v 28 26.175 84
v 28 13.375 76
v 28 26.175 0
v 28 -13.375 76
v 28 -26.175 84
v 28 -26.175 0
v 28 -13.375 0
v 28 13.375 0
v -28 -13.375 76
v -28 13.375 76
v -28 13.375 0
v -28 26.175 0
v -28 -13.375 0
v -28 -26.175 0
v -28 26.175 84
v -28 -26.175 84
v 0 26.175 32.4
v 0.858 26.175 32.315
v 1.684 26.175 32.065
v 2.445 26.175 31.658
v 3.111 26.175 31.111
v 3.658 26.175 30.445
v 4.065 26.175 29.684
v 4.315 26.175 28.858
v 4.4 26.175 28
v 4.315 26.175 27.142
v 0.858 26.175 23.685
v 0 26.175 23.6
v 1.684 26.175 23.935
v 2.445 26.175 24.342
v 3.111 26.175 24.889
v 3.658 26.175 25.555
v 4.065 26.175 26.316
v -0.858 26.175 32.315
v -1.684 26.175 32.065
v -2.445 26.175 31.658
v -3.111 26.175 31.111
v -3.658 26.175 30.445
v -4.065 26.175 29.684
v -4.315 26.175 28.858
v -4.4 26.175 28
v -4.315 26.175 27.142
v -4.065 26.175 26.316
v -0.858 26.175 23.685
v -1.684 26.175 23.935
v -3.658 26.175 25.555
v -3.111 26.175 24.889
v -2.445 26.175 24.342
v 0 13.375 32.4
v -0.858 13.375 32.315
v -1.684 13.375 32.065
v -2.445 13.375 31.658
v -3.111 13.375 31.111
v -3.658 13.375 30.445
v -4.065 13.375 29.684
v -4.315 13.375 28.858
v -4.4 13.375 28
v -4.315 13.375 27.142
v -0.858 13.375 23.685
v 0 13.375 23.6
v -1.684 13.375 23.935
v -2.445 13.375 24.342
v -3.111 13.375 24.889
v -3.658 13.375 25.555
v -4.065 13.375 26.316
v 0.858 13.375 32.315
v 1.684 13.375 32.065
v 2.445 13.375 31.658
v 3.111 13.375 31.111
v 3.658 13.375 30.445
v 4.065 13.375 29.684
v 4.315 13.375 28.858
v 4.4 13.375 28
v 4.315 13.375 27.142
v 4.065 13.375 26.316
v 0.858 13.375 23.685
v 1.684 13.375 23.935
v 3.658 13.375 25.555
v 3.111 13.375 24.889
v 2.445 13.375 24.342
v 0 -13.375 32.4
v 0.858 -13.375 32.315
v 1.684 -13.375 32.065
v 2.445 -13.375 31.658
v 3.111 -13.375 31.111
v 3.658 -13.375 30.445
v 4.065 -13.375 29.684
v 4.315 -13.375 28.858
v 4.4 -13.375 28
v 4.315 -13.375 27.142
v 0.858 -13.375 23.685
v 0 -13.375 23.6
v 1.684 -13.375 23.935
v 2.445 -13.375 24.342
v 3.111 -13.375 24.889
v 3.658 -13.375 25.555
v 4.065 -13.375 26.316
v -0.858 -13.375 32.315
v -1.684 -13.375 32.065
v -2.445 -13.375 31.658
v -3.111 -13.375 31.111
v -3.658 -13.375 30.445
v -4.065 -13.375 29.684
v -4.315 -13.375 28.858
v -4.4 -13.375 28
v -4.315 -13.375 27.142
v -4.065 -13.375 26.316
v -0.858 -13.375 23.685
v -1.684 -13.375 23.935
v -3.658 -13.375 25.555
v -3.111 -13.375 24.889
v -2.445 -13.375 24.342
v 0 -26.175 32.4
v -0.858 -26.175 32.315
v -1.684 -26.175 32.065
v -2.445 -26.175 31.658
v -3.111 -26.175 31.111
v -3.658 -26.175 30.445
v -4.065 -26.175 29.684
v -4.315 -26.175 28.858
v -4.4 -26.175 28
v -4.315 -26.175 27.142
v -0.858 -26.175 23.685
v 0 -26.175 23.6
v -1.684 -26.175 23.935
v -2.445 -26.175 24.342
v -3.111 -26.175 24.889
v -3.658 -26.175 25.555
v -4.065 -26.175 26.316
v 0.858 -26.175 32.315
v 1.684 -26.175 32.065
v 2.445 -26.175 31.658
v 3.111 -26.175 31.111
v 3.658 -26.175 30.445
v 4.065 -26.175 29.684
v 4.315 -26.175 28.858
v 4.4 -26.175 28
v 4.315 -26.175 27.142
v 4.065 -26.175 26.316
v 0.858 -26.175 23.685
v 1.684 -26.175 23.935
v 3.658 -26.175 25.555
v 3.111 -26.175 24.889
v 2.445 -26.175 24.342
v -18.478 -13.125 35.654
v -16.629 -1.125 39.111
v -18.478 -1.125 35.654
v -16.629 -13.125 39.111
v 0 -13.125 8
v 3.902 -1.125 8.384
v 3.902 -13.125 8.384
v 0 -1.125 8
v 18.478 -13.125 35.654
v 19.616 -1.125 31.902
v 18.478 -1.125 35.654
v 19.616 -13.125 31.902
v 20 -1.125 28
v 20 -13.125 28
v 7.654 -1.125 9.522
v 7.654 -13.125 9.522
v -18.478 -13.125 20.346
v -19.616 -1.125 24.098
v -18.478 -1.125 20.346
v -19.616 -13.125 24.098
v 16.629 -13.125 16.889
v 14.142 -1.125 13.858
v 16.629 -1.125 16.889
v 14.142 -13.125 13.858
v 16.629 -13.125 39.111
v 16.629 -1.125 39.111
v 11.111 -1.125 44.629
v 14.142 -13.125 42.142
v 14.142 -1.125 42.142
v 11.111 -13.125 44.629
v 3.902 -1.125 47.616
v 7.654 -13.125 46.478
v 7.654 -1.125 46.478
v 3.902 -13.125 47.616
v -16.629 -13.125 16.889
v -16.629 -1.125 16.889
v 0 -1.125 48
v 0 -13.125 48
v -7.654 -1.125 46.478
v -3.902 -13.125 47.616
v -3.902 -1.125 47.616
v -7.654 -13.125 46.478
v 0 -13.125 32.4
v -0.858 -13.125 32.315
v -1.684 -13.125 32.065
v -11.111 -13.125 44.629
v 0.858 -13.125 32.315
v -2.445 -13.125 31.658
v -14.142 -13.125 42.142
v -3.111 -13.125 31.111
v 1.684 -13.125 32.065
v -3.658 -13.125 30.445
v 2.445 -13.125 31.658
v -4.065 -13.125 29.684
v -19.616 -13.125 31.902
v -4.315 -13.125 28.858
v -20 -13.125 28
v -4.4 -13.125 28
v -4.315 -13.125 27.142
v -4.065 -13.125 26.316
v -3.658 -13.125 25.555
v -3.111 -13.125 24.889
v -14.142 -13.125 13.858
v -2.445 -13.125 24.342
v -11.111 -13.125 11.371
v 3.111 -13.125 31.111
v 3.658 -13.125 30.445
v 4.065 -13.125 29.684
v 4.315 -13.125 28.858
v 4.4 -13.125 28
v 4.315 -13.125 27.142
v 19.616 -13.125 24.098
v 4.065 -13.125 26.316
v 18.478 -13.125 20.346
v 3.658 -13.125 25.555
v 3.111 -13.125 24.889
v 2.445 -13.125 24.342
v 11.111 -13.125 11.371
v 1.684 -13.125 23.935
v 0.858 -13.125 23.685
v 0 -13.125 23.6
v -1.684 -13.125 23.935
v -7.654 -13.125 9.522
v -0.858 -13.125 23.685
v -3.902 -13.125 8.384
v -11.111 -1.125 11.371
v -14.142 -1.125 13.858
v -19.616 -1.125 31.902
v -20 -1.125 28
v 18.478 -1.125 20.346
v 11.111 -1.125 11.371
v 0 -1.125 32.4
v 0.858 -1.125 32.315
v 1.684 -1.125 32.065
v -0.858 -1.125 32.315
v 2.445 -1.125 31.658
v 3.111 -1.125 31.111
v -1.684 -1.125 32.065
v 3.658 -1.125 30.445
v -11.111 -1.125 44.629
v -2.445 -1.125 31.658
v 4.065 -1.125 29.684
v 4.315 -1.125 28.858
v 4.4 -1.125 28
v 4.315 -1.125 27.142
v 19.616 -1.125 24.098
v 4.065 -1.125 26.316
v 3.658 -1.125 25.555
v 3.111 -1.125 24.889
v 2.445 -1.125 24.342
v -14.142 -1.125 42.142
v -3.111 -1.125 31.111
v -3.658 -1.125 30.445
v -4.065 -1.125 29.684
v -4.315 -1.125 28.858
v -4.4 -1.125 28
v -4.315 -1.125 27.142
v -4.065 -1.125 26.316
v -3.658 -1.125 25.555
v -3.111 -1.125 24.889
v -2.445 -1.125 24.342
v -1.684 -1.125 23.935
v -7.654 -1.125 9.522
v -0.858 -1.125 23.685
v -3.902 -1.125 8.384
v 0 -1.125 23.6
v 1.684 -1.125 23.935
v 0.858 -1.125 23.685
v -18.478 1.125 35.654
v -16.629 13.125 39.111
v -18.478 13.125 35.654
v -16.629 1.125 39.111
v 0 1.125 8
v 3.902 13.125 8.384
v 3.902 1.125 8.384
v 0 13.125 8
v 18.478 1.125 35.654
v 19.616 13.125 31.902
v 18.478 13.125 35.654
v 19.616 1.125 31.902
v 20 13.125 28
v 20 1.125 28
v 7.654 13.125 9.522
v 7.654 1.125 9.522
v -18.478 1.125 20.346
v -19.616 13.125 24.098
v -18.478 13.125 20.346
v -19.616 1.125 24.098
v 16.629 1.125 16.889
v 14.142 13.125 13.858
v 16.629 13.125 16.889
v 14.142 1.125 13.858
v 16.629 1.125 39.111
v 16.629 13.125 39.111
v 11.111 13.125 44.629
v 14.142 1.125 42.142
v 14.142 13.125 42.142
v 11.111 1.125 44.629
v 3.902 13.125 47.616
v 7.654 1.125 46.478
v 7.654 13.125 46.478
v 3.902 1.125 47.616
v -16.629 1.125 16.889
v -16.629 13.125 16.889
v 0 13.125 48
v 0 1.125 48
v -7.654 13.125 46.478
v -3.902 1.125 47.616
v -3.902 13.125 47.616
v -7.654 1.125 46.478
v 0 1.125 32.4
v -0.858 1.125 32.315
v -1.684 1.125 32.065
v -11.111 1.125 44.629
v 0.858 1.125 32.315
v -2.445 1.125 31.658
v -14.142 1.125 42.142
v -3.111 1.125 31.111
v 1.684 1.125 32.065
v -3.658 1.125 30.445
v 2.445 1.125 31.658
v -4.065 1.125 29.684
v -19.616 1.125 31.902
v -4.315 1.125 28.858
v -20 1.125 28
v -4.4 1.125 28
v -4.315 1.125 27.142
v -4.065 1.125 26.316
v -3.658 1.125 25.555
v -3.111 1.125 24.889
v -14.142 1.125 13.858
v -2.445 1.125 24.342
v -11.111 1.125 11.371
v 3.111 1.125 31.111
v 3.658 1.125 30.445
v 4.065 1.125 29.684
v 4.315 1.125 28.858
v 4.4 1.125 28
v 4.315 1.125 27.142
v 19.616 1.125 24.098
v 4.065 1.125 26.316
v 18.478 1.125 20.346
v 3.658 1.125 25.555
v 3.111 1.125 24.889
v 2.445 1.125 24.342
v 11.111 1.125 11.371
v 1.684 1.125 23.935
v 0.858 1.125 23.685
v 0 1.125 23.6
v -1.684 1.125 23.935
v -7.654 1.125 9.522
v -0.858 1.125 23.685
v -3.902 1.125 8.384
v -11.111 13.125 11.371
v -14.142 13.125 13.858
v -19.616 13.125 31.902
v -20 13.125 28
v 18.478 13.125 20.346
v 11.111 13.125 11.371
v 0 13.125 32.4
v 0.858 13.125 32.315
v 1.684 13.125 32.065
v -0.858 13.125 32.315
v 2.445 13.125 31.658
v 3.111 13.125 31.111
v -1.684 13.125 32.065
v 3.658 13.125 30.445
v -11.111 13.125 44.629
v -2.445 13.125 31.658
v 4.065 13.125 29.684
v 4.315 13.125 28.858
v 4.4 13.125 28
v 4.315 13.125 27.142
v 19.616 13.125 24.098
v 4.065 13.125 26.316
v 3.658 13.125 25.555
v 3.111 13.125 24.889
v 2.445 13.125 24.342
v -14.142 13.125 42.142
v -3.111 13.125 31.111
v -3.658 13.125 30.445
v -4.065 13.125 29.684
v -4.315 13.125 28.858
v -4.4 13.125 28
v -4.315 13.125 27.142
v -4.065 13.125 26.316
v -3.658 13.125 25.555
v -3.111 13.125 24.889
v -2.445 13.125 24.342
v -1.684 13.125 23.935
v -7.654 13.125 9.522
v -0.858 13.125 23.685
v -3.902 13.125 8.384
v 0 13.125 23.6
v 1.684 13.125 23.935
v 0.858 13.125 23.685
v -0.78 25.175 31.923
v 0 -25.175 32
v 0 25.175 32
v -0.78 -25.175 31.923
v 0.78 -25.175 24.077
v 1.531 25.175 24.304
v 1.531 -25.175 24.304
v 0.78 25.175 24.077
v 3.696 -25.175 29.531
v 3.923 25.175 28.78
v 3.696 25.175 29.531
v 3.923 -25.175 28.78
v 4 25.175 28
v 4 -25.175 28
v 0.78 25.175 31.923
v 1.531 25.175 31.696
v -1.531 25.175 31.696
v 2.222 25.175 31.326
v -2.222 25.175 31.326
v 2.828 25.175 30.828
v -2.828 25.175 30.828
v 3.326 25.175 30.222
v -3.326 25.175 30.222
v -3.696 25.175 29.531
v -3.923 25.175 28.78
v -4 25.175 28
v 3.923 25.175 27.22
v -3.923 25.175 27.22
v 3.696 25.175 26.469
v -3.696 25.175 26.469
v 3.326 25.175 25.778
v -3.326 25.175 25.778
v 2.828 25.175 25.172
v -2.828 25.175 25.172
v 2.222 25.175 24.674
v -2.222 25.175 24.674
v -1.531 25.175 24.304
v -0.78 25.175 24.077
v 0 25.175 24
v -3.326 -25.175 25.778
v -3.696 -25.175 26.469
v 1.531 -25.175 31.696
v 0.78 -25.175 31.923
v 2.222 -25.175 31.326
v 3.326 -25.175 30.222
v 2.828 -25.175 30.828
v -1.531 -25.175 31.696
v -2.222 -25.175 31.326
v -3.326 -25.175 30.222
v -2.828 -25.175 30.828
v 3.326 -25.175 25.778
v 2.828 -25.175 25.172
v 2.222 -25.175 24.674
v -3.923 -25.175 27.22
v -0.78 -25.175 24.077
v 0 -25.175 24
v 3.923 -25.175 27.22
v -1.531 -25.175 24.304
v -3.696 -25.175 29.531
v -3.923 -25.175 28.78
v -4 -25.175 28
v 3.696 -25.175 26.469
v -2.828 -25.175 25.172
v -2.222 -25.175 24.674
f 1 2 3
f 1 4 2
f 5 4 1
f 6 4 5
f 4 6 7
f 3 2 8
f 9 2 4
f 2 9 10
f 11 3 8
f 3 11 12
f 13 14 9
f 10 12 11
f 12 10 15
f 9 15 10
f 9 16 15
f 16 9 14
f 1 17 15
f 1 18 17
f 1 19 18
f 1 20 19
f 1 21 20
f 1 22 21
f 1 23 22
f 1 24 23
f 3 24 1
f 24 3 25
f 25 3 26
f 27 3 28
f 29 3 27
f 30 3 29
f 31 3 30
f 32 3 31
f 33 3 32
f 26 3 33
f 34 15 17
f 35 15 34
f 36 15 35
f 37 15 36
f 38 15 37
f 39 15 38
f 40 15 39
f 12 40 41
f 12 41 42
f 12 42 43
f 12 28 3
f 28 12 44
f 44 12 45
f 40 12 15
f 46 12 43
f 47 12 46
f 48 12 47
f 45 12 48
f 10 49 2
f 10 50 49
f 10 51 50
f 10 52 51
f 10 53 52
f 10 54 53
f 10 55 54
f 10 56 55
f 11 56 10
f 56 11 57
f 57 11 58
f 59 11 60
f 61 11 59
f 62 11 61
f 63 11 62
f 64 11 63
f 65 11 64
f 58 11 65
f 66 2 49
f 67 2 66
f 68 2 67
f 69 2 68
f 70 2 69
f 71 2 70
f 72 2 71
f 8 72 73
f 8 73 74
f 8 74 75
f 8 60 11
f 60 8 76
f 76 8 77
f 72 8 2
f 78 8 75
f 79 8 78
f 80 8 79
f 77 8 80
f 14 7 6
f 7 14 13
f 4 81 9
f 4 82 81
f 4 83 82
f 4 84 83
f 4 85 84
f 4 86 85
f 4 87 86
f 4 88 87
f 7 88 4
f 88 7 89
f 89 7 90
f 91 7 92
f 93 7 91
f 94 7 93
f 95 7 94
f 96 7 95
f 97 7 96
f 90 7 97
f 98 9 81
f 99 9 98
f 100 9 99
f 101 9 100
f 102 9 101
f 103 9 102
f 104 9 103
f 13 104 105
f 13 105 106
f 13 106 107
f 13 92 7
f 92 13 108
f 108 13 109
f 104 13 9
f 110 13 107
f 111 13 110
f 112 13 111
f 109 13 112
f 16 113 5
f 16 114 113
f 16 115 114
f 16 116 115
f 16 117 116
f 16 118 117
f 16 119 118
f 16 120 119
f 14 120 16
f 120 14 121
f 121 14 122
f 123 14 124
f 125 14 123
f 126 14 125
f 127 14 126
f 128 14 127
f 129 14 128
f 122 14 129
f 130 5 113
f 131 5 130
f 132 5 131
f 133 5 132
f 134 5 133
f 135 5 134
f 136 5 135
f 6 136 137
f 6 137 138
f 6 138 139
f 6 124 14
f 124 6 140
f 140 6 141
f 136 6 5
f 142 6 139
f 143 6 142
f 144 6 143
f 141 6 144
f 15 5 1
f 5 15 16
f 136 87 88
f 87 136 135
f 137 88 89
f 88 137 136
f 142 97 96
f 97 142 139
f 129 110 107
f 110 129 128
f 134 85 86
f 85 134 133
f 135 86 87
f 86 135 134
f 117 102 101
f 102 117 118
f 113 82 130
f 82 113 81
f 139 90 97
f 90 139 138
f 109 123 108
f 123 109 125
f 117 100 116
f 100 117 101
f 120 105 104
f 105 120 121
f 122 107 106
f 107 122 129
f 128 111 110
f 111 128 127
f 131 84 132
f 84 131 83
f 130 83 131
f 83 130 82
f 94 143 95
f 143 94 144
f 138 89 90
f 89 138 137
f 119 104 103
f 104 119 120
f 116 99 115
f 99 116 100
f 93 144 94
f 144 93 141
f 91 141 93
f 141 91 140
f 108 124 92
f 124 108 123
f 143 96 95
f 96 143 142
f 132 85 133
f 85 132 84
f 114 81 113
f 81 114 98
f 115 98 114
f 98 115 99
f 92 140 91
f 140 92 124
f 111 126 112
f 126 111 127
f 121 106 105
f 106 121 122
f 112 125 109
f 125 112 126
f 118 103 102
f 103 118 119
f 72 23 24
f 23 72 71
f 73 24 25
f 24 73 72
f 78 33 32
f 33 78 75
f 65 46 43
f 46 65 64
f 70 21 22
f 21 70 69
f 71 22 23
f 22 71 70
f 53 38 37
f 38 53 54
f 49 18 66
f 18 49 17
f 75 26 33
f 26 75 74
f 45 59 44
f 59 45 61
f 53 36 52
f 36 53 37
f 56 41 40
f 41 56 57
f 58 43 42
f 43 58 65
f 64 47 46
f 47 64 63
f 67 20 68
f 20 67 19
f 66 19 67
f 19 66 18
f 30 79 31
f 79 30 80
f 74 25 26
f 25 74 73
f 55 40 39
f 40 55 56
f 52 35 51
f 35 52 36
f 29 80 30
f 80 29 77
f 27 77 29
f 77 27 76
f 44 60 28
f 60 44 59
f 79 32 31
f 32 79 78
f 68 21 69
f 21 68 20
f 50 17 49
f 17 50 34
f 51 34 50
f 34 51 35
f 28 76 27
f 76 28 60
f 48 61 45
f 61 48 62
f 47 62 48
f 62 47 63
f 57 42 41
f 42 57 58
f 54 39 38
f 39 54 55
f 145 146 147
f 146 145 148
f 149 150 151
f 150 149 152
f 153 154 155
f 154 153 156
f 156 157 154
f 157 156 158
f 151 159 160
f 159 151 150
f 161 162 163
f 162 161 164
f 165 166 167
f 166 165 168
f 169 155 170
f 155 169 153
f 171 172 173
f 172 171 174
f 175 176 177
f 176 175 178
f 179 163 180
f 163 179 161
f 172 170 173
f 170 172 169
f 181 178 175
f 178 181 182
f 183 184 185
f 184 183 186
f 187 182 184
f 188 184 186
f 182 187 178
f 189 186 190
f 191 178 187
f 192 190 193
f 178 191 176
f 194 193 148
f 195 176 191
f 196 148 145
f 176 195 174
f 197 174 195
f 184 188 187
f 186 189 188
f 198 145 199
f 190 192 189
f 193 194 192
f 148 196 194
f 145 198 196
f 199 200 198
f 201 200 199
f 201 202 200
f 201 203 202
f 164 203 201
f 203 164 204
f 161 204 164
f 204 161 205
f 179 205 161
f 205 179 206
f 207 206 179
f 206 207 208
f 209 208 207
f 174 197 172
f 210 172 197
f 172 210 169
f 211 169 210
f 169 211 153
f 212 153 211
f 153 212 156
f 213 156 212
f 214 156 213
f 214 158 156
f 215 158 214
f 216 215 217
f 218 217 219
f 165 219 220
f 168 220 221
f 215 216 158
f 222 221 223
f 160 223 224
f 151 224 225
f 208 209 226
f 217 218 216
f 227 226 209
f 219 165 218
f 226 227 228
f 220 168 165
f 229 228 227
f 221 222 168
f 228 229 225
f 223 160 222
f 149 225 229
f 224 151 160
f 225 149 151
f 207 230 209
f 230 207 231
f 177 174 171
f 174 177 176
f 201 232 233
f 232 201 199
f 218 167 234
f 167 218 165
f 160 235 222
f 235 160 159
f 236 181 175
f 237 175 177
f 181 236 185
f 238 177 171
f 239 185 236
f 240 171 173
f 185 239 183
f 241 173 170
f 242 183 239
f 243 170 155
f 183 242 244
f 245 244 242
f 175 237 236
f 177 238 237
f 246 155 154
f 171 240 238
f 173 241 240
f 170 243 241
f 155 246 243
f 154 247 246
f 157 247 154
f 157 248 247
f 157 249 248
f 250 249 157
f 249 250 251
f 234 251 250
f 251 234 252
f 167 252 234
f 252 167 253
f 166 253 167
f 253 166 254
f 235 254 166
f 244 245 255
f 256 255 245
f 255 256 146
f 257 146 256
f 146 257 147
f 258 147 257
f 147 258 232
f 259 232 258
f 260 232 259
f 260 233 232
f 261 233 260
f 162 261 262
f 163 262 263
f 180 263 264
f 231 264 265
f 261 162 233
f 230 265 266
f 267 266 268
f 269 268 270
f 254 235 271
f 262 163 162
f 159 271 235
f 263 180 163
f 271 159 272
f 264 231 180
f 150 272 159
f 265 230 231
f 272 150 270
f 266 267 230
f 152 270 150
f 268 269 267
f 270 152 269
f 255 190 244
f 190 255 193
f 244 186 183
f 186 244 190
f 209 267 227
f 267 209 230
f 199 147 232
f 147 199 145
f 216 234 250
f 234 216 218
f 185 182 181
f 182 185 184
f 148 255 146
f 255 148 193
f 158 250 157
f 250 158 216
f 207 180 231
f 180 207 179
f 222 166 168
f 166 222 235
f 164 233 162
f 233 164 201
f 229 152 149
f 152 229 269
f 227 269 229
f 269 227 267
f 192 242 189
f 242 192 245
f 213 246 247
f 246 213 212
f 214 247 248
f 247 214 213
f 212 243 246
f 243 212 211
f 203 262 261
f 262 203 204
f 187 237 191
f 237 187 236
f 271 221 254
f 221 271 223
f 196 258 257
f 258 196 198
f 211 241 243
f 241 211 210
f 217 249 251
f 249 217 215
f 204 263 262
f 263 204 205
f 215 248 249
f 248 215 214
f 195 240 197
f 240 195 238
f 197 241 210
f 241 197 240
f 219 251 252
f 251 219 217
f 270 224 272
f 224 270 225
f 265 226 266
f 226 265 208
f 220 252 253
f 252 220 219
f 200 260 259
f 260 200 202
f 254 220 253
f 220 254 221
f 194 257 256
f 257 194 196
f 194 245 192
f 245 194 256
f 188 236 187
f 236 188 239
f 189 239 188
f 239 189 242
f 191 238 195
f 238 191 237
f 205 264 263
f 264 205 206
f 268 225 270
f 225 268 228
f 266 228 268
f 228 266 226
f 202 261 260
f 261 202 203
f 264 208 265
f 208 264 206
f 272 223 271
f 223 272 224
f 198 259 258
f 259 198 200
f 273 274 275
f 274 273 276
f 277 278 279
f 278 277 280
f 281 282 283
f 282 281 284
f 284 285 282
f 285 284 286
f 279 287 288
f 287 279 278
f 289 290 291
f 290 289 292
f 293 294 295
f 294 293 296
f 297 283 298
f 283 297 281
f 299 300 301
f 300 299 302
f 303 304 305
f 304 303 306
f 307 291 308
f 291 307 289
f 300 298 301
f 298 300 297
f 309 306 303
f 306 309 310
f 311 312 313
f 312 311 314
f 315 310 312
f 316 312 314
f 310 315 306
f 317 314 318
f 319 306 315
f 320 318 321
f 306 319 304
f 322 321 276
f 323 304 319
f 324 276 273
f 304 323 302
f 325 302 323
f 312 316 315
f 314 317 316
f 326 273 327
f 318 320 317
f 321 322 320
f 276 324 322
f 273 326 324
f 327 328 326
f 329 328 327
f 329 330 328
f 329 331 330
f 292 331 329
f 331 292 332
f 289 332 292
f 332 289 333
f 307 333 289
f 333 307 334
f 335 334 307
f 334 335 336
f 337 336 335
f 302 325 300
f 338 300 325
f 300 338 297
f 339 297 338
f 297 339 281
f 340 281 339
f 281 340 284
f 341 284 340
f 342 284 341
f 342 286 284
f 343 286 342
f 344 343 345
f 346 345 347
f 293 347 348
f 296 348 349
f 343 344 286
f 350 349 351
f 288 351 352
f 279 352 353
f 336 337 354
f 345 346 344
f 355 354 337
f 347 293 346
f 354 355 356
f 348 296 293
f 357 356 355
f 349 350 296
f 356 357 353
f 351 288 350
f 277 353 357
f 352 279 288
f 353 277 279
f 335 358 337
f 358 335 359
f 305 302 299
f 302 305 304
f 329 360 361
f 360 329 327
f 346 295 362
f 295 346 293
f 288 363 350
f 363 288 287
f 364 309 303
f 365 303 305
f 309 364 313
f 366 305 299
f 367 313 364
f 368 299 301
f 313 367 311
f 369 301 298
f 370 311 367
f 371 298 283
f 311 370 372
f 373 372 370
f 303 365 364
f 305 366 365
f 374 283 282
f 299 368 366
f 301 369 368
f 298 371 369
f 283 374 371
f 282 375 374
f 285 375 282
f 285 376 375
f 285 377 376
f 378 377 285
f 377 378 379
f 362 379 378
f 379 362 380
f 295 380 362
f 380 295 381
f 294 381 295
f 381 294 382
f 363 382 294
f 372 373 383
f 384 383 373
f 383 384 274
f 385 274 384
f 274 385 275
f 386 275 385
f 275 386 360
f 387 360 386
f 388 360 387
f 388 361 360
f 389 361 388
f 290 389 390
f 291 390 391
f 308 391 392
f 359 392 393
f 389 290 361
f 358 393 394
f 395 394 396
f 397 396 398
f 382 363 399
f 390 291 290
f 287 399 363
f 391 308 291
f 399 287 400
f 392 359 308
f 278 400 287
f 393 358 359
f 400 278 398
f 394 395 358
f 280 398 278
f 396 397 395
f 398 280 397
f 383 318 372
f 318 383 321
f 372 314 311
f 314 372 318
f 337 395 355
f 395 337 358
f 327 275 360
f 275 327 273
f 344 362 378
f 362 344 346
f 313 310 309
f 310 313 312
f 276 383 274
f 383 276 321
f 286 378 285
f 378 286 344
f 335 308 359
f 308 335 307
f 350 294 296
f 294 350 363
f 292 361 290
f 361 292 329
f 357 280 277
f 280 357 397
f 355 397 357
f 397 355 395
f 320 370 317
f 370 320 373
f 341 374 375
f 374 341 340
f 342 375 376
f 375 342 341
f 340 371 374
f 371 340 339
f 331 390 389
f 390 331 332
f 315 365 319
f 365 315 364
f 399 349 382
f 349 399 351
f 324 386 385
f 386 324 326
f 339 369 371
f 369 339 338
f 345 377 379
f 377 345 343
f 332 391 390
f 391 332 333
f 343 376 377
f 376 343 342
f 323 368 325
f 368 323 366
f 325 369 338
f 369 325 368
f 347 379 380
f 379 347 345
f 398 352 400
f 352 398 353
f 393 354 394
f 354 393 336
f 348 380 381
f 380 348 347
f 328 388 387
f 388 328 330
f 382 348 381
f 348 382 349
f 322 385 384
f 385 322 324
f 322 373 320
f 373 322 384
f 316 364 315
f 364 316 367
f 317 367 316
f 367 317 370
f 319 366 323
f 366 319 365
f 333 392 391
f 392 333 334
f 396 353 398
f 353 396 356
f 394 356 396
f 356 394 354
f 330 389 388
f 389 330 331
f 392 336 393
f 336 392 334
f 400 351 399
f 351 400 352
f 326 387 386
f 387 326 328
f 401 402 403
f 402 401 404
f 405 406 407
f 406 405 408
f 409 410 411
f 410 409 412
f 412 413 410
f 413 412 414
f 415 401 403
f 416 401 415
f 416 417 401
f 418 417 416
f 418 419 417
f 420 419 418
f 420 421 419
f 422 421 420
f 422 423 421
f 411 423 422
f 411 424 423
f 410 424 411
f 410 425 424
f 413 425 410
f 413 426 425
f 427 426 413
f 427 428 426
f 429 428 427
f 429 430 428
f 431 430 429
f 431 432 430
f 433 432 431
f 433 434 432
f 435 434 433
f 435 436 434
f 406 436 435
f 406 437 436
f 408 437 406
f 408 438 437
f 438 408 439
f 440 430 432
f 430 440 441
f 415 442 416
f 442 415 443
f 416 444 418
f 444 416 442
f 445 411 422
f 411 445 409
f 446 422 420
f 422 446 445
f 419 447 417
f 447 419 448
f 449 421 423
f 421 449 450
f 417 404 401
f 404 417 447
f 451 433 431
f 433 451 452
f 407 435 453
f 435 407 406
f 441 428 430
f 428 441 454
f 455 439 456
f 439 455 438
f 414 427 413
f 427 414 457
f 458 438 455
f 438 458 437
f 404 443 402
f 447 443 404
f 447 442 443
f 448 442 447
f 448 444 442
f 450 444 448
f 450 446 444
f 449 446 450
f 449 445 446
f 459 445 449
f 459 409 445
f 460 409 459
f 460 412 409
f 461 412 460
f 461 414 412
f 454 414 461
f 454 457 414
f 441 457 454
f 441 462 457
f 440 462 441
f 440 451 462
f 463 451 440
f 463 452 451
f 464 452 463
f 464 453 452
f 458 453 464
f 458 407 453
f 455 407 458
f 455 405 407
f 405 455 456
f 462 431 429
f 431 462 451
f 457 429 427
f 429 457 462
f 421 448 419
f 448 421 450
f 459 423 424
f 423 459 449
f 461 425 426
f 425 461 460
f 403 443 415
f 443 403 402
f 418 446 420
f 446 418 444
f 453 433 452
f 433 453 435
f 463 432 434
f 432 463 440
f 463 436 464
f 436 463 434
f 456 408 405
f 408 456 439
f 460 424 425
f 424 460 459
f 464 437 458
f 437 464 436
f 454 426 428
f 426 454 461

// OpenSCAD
$fn = 32;

// ------------------------------------------------------------------------
// Trolley wheel set: wheels d40, fork 76 mm tall
// Every part is its own module, assembly() places every instance.
// ------------------------------------------------------------------------

// --- part 1 ---
module trolley_fork() {
  difference() {
    union() {
      translate([-28, 13.375, 0]) cube([56, 12.8, 76]);
      translate([-28, -26.175, 0]) cube([56, 12.8, 76]);
      translate([-28, -26.175, 76]) cube([56, 52.35, 8]);
    }
    translate([0, -19.775, 28]) rotate([90, 0, 0]) cylinder(h = 14.8, d = 8.8, center = true);
    translate([0, 19.775, 28]) rotate([90, 0, 0]) cylinder(h = 14.8, d = 8.8, center = true);
  }
}

// --- part 2 ---
module trolley_wheel() {
  difference() {
      translate([0, 0, 0]) cylinder(h = 12, d = 40);
      translate([0, 0, -1]) cylinder(h = 14, d = 8.8);
    }
}

// --- part 3 ---
module trolley_axle() {
  translate([0, 0, -25.175]) cylinder(h = 50.35, d = 8);
}

// --- assembly ---
module assembly() {
  color([0.80, 0.24, 0.20]) translate([0, 0, 0]) rotate([0, 0, 0]) trolley_fork();
  color([0.20, 0.45, 0.75]) translate([0, -1.125, 28]) rotate([90, 0, 0]) trolley_wheel();
  color([0.25, 0.62, 0.32]) translate([0, 13.125, 28]) rotate([90, 0, 0]) trolley_wheel();
  color([0.92, 0.70, 0.18]) translate([0, 0, 28]) rotate([90, 0, 0]) trolley_axle();
}

assembly();
